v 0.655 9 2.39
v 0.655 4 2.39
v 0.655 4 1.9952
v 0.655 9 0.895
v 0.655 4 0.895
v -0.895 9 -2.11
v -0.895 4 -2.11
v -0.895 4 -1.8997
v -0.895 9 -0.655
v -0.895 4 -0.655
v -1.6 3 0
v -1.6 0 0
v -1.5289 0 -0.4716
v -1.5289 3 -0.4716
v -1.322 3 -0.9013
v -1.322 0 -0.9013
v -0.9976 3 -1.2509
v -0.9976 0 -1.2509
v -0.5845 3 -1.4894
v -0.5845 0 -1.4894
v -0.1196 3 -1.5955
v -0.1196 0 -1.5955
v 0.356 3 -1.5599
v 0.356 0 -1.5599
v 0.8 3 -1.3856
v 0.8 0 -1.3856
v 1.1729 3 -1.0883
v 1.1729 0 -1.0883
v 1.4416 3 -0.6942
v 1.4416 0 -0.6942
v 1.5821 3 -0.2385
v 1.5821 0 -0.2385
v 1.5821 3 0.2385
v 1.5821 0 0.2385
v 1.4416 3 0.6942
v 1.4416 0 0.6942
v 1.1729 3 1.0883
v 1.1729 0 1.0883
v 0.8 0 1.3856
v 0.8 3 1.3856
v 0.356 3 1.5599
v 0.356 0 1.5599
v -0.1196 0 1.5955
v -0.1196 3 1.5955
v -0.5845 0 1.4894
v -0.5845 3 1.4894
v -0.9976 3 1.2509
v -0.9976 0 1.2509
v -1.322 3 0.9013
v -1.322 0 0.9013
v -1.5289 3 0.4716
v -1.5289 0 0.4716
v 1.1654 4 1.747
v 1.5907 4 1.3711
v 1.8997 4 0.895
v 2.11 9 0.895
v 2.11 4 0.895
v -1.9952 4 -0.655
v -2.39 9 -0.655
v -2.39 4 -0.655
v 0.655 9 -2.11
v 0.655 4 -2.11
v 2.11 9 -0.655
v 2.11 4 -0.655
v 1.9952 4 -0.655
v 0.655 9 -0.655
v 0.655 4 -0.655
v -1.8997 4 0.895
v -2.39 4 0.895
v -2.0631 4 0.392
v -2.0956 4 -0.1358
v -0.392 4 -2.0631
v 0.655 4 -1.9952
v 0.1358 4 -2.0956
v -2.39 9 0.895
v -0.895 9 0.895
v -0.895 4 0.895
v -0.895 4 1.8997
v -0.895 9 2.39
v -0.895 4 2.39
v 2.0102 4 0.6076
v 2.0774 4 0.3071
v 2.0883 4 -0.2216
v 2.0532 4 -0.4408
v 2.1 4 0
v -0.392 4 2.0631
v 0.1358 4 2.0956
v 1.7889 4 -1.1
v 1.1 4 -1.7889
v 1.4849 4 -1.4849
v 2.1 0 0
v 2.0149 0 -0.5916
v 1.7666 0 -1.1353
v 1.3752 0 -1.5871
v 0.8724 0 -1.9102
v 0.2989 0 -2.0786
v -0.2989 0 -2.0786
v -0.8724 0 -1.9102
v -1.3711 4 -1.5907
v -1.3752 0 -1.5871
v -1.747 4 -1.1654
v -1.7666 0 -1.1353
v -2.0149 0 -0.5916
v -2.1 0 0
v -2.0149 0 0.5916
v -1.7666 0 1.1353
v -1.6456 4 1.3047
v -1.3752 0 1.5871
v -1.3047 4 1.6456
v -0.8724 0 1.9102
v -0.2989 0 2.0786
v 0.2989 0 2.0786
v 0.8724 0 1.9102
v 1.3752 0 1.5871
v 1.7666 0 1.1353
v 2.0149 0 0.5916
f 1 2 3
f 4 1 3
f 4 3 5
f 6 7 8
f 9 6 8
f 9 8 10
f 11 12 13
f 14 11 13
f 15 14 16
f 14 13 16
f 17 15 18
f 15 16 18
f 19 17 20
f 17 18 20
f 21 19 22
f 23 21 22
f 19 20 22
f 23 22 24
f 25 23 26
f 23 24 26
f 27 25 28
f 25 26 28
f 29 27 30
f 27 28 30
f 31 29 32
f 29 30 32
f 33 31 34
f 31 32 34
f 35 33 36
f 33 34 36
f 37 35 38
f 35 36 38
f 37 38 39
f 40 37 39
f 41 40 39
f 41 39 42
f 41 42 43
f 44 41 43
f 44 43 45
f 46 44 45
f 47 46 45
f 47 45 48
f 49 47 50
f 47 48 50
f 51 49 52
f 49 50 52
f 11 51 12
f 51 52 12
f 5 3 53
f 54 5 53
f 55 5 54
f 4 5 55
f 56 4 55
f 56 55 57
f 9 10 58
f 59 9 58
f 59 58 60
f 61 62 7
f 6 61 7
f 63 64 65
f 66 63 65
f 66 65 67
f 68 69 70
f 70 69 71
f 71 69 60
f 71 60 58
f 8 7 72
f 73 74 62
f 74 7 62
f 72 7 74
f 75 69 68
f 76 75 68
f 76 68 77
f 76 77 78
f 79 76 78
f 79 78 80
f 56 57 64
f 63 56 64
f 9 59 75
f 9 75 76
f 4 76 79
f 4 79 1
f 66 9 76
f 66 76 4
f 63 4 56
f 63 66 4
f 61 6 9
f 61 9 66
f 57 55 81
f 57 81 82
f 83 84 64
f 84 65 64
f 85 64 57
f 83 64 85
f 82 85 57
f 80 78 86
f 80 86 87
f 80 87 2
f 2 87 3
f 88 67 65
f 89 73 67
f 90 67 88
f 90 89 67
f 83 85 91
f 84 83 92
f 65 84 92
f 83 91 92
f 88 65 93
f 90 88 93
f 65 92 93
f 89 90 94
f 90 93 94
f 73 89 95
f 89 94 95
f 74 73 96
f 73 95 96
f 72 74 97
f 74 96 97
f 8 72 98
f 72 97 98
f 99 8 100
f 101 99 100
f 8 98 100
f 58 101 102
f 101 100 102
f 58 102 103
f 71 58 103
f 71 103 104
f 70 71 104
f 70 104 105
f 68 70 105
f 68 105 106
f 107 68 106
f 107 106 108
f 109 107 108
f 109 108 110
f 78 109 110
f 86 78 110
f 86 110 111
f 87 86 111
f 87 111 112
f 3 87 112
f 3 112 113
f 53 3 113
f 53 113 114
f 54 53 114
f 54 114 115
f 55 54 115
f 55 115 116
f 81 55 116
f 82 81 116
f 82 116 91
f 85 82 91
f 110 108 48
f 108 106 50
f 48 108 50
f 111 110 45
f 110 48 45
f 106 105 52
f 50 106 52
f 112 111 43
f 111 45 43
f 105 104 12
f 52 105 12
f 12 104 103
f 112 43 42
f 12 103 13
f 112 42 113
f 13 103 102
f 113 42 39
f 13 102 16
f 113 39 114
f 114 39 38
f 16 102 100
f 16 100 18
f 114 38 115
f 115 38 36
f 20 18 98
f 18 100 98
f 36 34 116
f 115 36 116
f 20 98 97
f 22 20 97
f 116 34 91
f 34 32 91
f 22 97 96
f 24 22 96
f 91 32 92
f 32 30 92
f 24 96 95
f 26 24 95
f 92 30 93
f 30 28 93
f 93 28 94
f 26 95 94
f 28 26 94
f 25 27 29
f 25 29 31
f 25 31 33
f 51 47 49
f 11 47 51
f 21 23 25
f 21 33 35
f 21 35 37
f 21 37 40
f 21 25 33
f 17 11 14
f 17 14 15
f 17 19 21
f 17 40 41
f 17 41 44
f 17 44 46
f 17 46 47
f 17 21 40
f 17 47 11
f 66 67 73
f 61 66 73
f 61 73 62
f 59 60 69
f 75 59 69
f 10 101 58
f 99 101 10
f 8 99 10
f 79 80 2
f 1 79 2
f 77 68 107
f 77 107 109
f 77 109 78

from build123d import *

# Parameters (mm, degrees)
SKETCH1_R           = 2.1
BOSS_EXTRUDE1_DEPTH = 4
SKETCH2_R           = 1.6
CUT_EXTRUDE1_DEPTH  = 3
BOSS_EXTRUDE2_DEPTH = 5


with BuildPart() as part:
    # Sketch1 → Boss-Extrude1 (new body)
    with BuildSketch(Plane(origin=(0, 0, 0), x_dir=(1, 0, 0), z_dir=(0, 1, 0))):
        Circle(SKETCH1_R)
    extrude(amount=BOSS_EXTRUDE1_DEPTH)

    # Sketch2 → Cut-Extrude1 (cut)
    with BuildSketch(Plane(origin=(0, 0, 0), x_dir=(-1, 0, 0), z_dir=(0, -1, 0))):
        Circle(SKETCH2_R)
    extrude(amount=-CUT_EXTRUDE1_DEPTH, mode=Mode.SUBTRACT)

    # Sketch3 → Boss-Extrude2 (add)
    with BuildSketch(Plane(origin=(0, 4, 0), x_dir=(1, 0, 0), z_dir=(0, 1, 0))):
        Polygon((-0.895, 0.655), (-2.39, 0.655), (-2.39, -0.895), (-0.895, -0.895), (-0.895, -2.39), (0.655, -2.39), (0.655, -0.895), (2.11, -0.895), (2.11, 0.655), (0.655, 0.655), (0.655, 2.11), (-0.895, 2.11), align=None)
    extrude(amount=BOSS_EXTRUDE2_DEPTH)


solid = part.part
